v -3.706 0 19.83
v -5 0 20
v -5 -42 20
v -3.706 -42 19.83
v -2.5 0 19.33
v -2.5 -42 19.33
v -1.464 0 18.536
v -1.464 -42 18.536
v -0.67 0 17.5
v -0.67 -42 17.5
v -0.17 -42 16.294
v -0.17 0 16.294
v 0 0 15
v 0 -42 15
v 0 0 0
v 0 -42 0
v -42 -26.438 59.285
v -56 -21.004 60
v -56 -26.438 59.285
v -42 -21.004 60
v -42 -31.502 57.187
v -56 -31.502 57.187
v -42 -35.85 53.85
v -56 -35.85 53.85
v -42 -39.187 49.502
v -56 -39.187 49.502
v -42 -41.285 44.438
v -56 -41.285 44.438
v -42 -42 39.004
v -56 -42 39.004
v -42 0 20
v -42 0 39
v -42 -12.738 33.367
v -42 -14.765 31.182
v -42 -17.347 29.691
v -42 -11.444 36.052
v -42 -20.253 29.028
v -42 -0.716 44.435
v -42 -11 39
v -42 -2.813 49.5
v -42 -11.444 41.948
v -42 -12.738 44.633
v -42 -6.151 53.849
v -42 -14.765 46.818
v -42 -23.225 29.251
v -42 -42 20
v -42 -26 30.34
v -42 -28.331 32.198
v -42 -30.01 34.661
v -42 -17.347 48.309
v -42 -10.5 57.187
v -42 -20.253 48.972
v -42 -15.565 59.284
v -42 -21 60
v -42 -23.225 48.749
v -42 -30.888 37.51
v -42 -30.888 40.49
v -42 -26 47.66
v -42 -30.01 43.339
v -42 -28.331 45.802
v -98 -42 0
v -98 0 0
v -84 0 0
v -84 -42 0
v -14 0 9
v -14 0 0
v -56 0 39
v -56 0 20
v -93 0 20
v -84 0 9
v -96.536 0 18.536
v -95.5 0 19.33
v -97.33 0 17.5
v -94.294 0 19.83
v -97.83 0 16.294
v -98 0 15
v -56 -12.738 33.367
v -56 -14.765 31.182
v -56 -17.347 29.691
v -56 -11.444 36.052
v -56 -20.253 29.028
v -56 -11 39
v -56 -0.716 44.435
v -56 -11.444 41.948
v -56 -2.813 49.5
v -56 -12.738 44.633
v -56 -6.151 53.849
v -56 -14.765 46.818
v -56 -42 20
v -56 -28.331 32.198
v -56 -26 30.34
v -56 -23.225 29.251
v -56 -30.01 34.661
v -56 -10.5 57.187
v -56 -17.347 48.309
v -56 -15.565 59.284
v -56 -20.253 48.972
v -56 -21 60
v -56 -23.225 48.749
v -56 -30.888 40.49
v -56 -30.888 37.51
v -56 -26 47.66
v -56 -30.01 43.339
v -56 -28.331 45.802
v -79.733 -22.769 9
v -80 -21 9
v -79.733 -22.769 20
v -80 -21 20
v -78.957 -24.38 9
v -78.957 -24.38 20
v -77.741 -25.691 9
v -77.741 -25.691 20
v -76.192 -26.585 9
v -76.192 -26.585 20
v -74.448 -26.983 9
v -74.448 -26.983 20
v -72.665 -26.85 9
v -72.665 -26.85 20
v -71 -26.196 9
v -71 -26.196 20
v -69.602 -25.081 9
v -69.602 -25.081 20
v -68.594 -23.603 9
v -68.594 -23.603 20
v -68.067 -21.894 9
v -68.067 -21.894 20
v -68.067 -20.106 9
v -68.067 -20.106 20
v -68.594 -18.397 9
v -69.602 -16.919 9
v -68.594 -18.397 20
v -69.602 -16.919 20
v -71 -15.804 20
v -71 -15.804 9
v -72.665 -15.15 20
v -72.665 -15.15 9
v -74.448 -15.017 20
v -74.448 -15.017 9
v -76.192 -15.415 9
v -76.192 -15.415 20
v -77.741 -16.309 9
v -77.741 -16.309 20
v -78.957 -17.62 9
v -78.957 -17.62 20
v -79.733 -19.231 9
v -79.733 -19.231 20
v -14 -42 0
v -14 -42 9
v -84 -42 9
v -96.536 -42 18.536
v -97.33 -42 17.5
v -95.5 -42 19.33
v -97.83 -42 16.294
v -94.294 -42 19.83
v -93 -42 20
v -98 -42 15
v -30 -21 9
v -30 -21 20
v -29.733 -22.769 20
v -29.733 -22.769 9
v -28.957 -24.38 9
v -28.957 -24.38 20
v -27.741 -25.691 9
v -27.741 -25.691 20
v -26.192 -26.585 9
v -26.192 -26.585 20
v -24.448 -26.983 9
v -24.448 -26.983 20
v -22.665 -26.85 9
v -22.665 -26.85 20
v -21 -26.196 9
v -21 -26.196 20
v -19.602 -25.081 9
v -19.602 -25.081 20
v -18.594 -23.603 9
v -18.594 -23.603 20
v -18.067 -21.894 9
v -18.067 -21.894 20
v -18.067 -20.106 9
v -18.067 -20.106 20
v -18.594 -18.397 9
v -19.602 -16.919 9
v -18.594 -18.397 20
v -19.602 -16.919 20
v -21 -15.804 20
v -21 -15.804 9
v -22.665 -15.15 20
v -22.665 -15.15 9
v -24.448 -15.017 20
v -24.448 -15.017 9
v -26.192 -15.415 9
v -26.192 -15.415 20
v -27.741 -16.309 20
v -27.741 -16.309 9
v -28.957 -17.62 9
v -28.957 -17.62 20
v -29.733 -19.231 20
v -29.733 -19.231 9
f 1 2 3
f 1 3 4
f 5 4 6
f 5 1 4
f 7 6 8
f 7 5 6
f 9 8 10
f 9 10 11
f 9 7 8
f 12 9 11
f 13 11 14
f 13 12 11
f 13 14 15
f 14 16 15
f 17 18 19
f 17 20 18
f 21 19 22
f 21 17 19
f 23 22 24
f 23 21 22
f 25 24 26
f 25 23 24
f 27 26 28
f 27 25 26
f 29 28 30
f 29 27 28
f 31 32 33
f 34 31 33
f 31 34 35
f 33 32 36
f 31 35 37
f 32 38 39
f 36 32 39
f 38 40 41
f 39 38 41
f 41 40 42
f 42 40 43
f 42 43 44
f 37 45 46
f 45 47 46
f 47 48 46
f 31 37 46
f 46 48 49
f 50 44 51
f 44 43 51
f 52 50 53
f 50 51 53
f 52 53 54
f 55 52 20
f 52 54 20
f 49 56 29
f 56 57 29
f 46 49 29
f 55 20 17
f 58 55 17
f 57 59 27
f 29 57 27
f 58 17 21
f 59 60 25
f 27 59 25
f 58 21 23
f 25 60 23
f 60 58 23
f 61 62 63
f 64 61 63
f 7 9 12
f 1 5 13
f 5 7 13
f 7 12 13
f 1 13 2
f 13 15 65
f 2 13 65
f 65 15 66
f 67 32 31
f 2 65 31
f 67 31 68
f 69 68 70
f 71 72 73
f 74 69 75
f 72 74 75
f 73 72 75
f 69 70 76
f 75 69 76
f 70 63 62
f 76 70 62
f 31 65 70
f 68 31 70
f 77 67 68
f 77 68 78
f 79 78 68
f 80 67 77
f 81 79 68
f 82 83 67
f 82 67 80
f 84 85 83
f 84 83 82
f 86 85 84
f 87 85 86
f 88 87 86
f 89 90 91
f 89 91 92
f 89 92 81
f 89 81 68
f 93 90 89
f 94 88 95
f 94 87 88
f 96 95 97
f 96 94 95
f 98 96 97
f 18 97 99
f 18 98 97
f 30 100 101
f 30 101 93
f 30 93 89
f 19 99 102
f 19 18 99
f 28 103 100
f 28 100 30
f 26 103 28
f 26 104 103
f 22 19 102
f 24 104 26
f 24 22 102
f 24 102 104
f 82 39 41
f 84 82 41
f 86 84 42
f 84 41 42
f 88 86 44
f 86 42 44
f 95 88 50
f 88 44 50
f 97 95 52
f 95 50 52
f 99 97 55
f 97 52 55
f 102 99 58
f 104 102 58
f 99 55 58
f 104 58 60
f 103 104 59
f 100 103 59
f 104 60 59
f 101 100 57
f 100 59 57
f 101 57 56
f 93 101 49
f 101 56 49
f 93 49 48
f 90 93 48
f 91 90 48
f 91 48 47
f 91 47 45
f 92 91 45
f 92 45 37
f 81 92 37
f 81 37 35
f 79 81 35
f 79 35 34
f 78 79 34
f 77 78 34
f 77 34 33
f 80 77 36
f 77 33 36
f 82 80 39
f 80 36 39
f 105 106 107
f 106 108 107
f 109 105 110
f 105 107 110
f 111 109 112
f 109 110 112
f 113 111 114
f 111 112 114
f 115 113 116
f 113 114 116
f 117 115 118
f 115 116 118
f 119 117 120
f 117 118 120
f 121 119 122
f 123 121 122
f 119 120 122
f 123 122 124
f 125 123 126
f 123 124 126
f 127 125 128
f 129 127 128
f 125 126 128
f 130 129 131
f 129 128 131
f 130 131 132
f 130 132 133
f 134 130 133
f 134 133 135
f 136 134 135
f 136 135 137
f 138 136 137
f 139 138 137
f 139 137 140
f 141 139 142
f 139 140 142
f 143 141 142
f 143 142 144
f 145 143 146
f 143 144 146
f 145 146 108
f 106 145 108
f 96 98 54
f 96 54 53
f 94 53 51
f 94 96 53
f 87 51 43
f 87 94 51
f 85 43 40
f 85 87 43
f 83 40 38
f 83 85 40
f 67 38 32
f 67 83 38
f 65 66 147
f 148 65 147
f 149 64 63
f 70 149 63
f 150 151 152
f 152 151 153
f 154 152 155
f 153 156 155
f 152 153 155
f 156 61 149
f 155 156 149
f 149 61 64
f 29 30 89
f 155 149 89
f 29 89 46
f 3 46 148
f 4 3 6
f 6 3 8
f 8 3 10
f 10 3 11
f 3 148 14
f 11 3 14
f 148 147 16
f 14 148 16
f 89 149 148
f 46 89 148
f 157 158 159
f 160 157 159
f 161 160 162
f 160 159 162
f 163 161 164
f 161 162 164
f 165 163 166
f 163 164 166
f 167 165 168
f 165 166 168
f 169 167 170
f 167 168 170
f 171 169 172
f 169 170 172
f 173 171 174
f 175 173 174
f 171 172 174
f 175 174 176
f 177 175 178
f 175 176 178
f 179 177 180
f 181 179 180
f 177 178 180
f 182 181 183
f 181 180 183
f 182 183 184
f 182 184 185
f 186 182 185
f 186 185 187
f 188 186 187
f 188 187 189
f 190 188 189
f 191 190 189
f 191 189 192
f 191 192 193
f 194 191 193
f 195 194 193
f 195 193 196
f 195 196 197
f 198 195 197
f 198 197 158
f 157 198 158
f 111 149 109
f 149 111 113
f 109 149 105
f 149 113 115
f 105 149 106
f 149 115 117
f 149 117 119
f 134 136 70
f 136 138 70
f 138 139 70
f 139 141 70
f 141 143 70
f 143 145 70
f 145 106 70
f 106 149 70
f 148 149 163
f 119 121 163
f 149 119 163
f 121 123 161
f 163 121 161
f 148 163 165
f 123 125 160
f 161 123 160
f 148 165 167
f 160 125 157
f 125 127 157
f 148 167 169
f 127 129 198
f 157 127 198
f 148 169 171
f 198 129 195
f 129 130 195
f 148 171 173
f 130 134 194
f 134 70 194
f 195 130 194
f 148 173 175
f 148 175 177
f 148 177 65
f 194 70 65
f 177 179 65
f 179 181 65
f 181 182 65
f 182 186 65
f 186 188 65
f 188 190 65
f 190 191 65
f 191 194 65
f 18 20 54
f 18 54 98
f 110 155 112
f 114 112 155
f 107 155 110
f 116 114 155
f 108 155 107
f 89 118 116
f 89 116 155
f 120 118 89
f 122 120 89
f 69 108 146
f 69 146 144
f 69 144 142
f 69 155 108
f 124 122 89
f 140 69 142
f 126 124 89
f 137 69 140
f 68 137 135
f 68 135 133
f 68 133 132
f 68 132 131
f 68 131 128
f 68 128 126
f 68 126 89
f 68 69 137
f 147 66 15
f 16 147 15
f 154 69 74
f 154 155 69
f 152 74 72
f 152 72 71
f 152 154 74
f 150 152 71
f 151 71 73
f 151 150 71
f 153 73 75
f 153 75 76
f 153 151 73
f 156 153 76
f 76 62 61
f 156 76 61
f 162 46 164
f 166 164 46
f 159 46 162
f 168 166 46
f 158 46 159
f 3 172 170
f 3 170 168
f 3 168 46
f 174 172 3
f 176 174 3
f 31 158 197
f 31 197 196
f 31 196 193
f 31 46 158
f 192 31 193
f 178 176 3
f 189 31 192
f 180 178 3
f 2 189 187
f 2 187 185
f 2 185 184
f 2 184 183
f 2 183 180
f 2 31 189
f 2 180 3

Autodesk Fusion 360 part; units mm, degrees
sketch "Sketch1" plane through (0, 0, 0) normal (0, 0, 1) x (1, 0, 0)
  line L0 (0, 0) -> (-98, 0)
  line L1 (-98, 0) -> (-98, -42)
  line L2 (-98, -42) -> (0, -42)
  line L3 (0, -42) -> (0, 0)
  line L4 (0, 0) -> (-14, 0)
  line L5 (0, 0) -> (-14, 0)
  line L6 (-14, 0) -> (-14, -42)
  line L7 (-14, -42) -> (0, -42)
  line L8 (0, -42) -> (0, 0)
  line L9 (-98, 0) -> (-84, 0)
  line L10 (-98, 0) -> (-98, -42)
  line L11 (-84, 0) -> (-98, 0)
  line L12 (-98, 0) -> (-98, -42)
  line L13 (-98, -42) -> (-84, -42)
  line L14 (-84, -42) -> (-84, 0)
  dimension "d1" = 98
  dimension "d2" = 42
  dimension "d3" = 14
  dimension "d4" = 14
  dimension "d5" = 14
extrude "Extrude1" add sketch "Sketch1" along normal blind 20
extrude "Extrude2" cut sketch "Sketch1" along normal blind 9 contours L0 L2 L6 L14
sketch "Sketch2" plane through (0, 0, 0) normal (0, 0, 1) x (1, 0, 0)
sketch "Sketch3" plane through (0, 0, 20) normal (0, 0, 1) x (-1, 0, 0)
  line L0 (98, 42) -> (0, 42)
  line L1 (0, 42) -> (0, 0)
  line L2 (0, 0) -> (98, 0)
  line L3 (98, 0) -> (98, 42)
  line L4 (0, 0) -> (24, 0)
  line L5 (24, 0) -> (24, 42)
  line L6 (24, 42) -> (0, 42)
  line L7 (0, 42) -> (0, 0)
  circle A0 centre (24, 21) radius 6
  line L8 (98, 0) -> (74, 0)
  line L9 (74, 0) -> (74, 42)
  line L10 (74, 42) -> (98, 42)
  line L11 (98, 42) -> (98, 0)
  circle A1 centre (74, 21) radius 6
  dimension "d10" = 24
  dimension "d11" = 42
  dimension "d12" = 12
  dimension "d13" = 24
  dimension "d14" = 12
extrude "Extrude3" cut sketch "Sketch3" against normal blind 15 contours L5 A0 | L5 A0
extrude "Extrude4" cut sketch "Sketch3" against normal blind 15 contours L9 A1 | L9 A1
sketch "Sketch4" plane through (0, 0, 20) normal (0, 0, 1) x (-1, 0, 0)
  line L0 (74, 0) -> (24, 0)
  line L1 (24, 0) -> (24, 42)
  line L2 (24, 42) -> (74, 42)
  line L3 (74, 42) -> (74, 0)
extrude "Extrude5" add sketch "Sketch3" along normal blind 40 contours L0 L2 L5 A0 L9 A1
sketch "Sketch5" plane through (0, 0, 60) normal (0, 0, 1) x (-1, 0, 0)
  line L0 (24, 0) -> (74, 0)
  line L1 (74, 0) -> (74, 15)
  arc A0 (74, 27) -> (74, 15) centre (74, 21) ccw
  line L2 (74, 27) -> (74, 42)
  line L3 (74, 42) -> (24, 42)
  line L4 (24, 42) -> (24, 27)
  arc A1 (24, 15) -> (24, 27) centre (24, 21) ccw
  line L5 (24, 15) -> (24, 0)
  line L6 (74, 0) -> (24, 0)
  line L7 (24, 0) -> (24, 42)
  line L8 (24, 42) -> (74, 42)
  line L9 (74, 42) -> (74, 0)
  line L10 (74, 0) -> (49, 0)
  line L11 (74, 0) -> (49, 0)
  line L12 (49, 0) -> (49, 42)
  line L13 (49, 42) -> (74, 42)
  line L14 (74, 42) -> (74, 0)
  line L15 (49, 0) -> (42, 0)
  line L16 (42, 0) -> (42, 42)
  line L17 (42, 42) -> (49, 42)
  line L18 (49, 42) -> (49, 0)
  line L19 (49, 0) -> (56, 0)
  line L20 (56, 0) -> (56, 42)
  line L21 (56, 42) -> (49, 42)
  line L22 (49, 42) -> (49, 0)
  dimension "d21" = 25
  dimension "d22" = 7
  dimension "d23" = 7
extrude "Extrude6" cut sketch "Sketch5" against normal blind 40 contours L0 L1 A0 L2 L3 L6 L8 L9 L10 L11 L13 L14 L20
extrude "Extrude7" cut sketch "Sketch5" against normal blind 40 contours L0 L3 L4 A1 L5 L6 L7 L8 L16
sketch "Sketch6" plane through (0, 0, 60) normal (0, 0, 1) x (-1, 0, 0)
fillet "Fillet1" radius 5 1 edges at (-98, -21, 20)
fillet "Fillet2" radius 5 1 edges at (0, -21, 20)
fillet "Fillet3" radius 21 1 edges at (-49, 0, 60)
fillet "Fillet4" radius 21 1 edges at (-49, -42, 60)
sketch "Sketch7" plane through (-42, 0, 0) normal (1, 0, 0) x (0, 1, 0)
  arc A0 (0, 39) -> (-42, 39) centre (-21, 39) ccw
  line L0 (-42, 39) -> (-42, 20)
  line L1 (-42, 20) -> (0, 20)
  line L2 (0, 20) -> (0, 39)
  line L3 (-42, 39) -> (0, 39)
  line L4 (0, 39) -> (0, 20)
  line L5 (0, 20) -> (-42, 20)
  line L6 (-42, 20) -> (-42, 39)
  circle A1 centre (-21, 39) radius 10
  dimension "d36" = 20
extrude "Extrude8" cut sketch "Sketch7" against normal blind 14 contours L3 A1 | L3 A1
